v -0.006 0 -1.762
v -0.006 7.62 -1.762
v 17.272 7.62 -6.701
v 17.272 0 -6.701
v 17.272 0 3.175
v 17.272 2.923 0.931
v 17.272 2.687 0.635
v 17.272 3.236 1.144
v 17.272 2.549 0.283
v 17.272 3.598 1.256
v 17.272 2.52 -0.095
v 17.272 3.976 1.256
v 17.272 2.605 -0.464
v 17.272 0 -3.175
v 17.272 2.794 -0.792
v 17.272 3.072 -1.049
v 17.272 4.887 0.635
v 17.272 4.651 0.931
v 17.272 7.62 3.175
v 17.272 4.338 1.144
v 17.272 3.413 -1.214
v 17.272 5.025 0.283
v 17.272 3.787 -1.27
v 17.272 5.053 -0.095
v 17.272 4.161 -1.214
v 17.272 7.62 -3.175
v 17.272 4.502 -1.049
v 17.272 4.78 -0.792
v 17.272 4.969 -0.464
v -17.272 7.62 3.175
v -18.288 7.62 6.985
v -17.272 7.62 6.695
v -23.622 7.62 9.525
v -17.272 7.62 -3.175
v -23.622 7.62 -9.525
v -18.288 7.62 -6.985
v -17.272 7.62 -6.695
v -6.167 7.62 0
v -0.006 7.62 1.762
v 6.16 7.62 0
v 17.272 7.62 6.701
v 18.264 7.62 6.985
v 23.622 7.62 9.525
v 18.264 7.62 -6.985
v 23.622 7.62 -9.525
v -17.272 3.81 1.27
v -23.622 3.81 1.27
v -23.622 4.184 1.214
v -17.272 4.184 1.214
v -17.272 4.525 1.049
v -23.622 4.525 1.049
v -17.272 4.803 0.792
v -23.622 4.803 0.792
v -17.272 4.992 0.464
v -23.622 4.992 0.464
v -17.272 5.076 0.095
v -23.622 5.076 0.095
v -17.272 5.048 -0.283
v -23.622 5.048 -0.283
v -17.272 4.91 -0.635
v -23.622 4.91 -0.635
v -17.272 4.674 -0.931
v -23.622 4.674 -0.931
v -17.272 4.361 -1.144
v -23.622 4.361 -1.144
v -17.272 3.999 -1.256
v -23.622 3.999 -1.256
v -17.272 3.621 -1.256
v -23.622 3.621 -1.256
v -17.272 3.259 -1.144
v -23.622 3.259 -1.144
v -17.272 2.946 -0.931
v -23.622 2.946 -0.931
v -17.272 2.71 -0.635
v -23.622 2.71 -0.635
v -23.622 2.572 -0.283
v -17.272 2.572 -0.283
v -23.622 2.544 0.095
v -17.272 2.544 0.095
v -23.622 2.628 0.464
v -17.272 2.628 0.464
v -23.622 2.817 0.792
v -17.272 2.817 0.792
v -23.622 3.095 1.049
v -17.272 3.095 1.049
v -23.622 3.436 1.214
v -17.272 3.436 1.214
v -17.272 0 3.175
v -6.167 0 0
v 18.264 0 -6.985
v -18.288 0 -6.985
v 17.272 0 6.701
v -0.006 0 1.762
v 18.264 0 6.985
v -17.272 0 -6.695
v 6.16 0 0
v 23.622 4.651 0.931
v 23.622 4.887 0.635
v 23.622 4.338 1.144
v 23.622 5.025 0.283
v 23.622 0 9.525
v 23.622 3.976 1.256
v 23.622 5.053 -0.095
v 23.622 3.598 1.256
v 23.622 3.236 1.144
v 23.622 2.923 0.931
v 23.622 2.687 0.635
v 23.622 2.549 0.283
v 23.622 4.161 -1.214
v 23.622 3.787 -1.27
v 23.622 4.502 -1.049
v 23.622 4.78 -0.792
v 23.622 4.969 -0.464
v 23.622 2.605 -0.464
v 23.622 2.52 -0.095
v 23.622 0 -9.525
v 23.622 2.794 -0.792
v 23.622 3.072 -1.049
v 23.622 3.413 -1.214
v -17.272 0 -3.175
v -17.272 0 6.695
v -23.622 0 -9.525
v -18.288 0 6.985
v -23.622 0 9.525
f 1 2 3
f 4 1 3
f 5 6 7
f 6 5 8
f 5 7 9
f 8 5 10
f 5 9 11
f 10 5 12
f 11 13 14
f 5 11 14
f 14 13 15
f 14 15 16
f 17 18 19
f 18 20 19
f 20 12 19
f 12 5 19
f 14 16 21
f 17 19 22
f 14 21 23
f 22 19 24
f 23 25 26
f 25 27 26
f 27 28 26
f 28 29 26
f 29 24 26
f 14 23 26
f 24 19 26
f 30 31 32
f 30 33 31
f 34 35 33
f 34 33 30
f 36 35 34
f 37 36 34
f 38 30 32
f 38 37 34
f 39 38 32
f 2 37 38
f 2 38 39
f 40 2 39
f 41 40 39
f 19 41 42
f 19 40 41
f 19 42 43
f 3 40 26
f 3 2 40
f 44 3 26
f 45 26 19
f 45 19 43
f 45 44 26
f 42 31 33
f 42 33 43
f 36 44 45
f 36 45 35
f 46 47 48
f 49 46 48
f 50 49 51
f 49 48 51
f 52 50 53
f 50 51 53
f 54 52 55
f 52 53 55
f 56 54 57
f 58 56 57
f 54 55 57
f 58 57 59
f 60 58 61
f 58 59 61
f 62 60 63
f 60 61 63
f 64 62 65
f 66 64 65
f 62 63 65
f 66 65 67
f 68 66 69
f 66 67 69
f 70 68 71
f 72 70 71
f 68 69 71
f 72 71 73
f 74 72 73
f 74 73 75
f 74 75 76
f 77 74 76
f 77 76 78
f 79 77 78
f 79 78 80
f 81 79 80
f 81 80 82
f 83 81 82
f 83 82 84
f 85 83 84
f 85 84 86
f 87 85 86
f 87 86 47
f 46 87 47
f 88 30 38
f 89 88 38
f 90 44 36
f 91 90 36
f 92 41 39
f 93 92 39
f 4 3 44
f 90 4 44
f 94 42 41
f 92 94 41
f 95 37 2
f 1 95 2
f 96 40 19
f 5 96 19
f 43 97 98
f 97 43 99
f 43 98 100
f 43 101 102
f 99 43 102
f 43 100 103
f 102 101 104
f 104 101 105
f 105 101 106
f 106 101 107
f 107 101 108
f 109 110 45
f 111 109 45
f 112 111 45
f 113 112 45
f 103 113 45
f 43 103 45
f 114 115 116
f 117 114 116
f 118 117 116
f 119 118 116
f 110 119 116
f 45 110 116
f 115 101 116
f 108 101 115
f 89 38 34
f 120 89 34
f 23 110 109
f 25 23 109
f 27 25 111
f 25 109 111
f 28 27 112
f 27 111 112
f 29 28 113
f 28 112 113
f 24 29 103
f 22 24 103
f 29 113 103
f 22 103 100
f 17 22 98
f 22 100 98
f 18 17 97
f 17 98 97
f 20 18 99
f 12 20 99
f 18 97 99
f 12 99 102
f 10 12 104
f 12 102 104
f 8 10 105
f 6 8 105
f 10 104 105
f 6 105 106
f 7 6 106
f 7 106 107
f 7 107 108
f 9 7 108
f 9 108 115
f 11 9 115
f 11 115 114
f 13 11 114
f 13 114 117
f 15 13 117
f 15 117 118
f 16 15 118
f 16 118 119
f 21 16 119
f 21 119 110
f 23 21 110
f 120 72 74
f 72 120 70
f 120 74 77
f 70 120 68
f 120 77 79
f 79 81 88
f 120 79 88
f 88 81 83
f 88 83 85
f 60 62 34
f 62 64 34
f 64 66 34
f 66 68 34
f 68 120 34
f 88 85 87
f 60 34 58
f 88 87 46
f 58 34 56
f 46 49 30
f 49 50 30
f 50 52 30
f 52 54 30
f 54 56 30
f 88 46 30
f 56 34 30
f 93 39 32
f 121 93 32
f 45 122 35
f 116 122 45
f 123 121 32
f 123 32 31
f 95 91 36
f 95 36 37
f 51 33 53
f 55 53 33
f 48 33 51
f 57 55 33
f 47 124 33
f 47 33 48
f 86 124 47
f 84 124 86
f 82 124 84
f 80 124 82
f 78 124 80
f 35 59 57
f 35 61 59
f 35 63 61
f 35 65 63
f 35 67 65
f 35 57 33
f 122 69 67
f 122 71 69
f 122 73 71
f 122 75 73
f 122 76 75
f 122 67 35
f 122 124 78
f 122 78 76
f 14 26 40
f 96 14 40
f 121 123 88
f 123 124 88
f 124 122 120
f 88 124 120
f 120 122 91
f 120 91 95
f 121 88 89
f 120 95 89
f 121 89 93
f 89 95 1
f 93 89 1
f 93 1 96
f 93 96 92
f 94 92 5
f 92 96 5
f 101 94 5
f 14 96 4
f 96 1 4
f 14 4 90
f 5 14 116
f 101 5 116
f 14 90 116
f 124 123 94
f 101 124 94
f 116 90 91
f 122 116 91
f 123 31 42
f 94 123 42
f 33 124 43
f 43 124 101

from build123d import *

# Parameters (mm, degrees)
SKETCH1_W           = 47.244
SKETCH1_H           = 19.05
BOSS_EXTRUDE1_DEPTH = 7.62
SKETCH4_R           = 1.27
CUT_EXTRUDE3_DEPTH  = 7.62
SKETCH5_R           = 1.27
CUT_EXTRUDE4_DEPTH  = 7.62
CUT_EXTRUDE8_DEPTH  = 27.585501857


with BuildPart() as part:
    # Sketch1 → Boss-Extrude1 (new body)
    with BuildSketch(Plane(origin=(0, 0, 0), x_dir=(1, 0, 0), z_dir=(0, 1, 0))):
        Rectangle(SKETCH1_W, SKETCH1_H)
    extrude(amount=BOSS_EXTRUDE1_DEPTH)

    # Sketch4 → Cut-Extrude3 (cut)
    with BuildSketch(Plane(origin=(23.622, 0, 0), x_dir=(0, 0, -1), z_dir=(1, 0, 0))):
        with Locations((0, 3.786925891)):
            Circle(SKETCH4_R)
    extrude(amount=-CUT_EXTRUDE3_DEPTH, mode=Mode.SUBTRACT)

    # Sketch5 → Cut-Extrude4 (cut)
    with BuildSketch(Plane.ZY.offset(23.622)):
        with Locations((0, 3.81)):
            Circle(SKETCH5_R)
    extrude(amount=-CUT_EXTRUDE4_DEPTH, mode=Mode.SUBTRACT)

    # Sketch2 → Cut-Extrude8 (cut, through all)
    with BuildSketch(Plane(origin=(0, 7.62, 0), x_dir=(1, 0, 0), z_dir=(0, 1, 0))):
        Polygon((-17.272, 3.175), (-17.272, -3.175), (-6.166997771, 0), align=None)
        Polygon((17.272, 3.175), (6.1595, 0), (17.272, -3.175), align=None)
        Polygon((-17.272, 6.985), (-17.272, 6.694714286), (-0.005828805, 1.761522516), (17.272, 6.701378026), (17.272, 6.985), align=None)
        Polygon((-0.005828805, -1.761522516), (-17.272, -6.694714286), (-17.272, -6.985), (17.272, -6.985), (17.272, -6.701378026), align=None)
        Polygon((18.264007134, -6.985), (17.272, -6.701378026), (17.272, -6.985), align=None)
        Polygon((-17.272, -6.985), (-17.272, -6.694714286), (-18.288, -6.985), align=None)
        Polygon((-18.288, 6.985), (-17.272, 6.694714286), (-17.272, 6.985), align=None)
        Polygon((17.272, 6.985), (17.272, 6.701378026), (18.264007134, 6.985), align=None)
    extrude(amount=-CUT_EXTRUDE8_DEPTH, mode=Mode.SUBTRACT)


solid = part.part
